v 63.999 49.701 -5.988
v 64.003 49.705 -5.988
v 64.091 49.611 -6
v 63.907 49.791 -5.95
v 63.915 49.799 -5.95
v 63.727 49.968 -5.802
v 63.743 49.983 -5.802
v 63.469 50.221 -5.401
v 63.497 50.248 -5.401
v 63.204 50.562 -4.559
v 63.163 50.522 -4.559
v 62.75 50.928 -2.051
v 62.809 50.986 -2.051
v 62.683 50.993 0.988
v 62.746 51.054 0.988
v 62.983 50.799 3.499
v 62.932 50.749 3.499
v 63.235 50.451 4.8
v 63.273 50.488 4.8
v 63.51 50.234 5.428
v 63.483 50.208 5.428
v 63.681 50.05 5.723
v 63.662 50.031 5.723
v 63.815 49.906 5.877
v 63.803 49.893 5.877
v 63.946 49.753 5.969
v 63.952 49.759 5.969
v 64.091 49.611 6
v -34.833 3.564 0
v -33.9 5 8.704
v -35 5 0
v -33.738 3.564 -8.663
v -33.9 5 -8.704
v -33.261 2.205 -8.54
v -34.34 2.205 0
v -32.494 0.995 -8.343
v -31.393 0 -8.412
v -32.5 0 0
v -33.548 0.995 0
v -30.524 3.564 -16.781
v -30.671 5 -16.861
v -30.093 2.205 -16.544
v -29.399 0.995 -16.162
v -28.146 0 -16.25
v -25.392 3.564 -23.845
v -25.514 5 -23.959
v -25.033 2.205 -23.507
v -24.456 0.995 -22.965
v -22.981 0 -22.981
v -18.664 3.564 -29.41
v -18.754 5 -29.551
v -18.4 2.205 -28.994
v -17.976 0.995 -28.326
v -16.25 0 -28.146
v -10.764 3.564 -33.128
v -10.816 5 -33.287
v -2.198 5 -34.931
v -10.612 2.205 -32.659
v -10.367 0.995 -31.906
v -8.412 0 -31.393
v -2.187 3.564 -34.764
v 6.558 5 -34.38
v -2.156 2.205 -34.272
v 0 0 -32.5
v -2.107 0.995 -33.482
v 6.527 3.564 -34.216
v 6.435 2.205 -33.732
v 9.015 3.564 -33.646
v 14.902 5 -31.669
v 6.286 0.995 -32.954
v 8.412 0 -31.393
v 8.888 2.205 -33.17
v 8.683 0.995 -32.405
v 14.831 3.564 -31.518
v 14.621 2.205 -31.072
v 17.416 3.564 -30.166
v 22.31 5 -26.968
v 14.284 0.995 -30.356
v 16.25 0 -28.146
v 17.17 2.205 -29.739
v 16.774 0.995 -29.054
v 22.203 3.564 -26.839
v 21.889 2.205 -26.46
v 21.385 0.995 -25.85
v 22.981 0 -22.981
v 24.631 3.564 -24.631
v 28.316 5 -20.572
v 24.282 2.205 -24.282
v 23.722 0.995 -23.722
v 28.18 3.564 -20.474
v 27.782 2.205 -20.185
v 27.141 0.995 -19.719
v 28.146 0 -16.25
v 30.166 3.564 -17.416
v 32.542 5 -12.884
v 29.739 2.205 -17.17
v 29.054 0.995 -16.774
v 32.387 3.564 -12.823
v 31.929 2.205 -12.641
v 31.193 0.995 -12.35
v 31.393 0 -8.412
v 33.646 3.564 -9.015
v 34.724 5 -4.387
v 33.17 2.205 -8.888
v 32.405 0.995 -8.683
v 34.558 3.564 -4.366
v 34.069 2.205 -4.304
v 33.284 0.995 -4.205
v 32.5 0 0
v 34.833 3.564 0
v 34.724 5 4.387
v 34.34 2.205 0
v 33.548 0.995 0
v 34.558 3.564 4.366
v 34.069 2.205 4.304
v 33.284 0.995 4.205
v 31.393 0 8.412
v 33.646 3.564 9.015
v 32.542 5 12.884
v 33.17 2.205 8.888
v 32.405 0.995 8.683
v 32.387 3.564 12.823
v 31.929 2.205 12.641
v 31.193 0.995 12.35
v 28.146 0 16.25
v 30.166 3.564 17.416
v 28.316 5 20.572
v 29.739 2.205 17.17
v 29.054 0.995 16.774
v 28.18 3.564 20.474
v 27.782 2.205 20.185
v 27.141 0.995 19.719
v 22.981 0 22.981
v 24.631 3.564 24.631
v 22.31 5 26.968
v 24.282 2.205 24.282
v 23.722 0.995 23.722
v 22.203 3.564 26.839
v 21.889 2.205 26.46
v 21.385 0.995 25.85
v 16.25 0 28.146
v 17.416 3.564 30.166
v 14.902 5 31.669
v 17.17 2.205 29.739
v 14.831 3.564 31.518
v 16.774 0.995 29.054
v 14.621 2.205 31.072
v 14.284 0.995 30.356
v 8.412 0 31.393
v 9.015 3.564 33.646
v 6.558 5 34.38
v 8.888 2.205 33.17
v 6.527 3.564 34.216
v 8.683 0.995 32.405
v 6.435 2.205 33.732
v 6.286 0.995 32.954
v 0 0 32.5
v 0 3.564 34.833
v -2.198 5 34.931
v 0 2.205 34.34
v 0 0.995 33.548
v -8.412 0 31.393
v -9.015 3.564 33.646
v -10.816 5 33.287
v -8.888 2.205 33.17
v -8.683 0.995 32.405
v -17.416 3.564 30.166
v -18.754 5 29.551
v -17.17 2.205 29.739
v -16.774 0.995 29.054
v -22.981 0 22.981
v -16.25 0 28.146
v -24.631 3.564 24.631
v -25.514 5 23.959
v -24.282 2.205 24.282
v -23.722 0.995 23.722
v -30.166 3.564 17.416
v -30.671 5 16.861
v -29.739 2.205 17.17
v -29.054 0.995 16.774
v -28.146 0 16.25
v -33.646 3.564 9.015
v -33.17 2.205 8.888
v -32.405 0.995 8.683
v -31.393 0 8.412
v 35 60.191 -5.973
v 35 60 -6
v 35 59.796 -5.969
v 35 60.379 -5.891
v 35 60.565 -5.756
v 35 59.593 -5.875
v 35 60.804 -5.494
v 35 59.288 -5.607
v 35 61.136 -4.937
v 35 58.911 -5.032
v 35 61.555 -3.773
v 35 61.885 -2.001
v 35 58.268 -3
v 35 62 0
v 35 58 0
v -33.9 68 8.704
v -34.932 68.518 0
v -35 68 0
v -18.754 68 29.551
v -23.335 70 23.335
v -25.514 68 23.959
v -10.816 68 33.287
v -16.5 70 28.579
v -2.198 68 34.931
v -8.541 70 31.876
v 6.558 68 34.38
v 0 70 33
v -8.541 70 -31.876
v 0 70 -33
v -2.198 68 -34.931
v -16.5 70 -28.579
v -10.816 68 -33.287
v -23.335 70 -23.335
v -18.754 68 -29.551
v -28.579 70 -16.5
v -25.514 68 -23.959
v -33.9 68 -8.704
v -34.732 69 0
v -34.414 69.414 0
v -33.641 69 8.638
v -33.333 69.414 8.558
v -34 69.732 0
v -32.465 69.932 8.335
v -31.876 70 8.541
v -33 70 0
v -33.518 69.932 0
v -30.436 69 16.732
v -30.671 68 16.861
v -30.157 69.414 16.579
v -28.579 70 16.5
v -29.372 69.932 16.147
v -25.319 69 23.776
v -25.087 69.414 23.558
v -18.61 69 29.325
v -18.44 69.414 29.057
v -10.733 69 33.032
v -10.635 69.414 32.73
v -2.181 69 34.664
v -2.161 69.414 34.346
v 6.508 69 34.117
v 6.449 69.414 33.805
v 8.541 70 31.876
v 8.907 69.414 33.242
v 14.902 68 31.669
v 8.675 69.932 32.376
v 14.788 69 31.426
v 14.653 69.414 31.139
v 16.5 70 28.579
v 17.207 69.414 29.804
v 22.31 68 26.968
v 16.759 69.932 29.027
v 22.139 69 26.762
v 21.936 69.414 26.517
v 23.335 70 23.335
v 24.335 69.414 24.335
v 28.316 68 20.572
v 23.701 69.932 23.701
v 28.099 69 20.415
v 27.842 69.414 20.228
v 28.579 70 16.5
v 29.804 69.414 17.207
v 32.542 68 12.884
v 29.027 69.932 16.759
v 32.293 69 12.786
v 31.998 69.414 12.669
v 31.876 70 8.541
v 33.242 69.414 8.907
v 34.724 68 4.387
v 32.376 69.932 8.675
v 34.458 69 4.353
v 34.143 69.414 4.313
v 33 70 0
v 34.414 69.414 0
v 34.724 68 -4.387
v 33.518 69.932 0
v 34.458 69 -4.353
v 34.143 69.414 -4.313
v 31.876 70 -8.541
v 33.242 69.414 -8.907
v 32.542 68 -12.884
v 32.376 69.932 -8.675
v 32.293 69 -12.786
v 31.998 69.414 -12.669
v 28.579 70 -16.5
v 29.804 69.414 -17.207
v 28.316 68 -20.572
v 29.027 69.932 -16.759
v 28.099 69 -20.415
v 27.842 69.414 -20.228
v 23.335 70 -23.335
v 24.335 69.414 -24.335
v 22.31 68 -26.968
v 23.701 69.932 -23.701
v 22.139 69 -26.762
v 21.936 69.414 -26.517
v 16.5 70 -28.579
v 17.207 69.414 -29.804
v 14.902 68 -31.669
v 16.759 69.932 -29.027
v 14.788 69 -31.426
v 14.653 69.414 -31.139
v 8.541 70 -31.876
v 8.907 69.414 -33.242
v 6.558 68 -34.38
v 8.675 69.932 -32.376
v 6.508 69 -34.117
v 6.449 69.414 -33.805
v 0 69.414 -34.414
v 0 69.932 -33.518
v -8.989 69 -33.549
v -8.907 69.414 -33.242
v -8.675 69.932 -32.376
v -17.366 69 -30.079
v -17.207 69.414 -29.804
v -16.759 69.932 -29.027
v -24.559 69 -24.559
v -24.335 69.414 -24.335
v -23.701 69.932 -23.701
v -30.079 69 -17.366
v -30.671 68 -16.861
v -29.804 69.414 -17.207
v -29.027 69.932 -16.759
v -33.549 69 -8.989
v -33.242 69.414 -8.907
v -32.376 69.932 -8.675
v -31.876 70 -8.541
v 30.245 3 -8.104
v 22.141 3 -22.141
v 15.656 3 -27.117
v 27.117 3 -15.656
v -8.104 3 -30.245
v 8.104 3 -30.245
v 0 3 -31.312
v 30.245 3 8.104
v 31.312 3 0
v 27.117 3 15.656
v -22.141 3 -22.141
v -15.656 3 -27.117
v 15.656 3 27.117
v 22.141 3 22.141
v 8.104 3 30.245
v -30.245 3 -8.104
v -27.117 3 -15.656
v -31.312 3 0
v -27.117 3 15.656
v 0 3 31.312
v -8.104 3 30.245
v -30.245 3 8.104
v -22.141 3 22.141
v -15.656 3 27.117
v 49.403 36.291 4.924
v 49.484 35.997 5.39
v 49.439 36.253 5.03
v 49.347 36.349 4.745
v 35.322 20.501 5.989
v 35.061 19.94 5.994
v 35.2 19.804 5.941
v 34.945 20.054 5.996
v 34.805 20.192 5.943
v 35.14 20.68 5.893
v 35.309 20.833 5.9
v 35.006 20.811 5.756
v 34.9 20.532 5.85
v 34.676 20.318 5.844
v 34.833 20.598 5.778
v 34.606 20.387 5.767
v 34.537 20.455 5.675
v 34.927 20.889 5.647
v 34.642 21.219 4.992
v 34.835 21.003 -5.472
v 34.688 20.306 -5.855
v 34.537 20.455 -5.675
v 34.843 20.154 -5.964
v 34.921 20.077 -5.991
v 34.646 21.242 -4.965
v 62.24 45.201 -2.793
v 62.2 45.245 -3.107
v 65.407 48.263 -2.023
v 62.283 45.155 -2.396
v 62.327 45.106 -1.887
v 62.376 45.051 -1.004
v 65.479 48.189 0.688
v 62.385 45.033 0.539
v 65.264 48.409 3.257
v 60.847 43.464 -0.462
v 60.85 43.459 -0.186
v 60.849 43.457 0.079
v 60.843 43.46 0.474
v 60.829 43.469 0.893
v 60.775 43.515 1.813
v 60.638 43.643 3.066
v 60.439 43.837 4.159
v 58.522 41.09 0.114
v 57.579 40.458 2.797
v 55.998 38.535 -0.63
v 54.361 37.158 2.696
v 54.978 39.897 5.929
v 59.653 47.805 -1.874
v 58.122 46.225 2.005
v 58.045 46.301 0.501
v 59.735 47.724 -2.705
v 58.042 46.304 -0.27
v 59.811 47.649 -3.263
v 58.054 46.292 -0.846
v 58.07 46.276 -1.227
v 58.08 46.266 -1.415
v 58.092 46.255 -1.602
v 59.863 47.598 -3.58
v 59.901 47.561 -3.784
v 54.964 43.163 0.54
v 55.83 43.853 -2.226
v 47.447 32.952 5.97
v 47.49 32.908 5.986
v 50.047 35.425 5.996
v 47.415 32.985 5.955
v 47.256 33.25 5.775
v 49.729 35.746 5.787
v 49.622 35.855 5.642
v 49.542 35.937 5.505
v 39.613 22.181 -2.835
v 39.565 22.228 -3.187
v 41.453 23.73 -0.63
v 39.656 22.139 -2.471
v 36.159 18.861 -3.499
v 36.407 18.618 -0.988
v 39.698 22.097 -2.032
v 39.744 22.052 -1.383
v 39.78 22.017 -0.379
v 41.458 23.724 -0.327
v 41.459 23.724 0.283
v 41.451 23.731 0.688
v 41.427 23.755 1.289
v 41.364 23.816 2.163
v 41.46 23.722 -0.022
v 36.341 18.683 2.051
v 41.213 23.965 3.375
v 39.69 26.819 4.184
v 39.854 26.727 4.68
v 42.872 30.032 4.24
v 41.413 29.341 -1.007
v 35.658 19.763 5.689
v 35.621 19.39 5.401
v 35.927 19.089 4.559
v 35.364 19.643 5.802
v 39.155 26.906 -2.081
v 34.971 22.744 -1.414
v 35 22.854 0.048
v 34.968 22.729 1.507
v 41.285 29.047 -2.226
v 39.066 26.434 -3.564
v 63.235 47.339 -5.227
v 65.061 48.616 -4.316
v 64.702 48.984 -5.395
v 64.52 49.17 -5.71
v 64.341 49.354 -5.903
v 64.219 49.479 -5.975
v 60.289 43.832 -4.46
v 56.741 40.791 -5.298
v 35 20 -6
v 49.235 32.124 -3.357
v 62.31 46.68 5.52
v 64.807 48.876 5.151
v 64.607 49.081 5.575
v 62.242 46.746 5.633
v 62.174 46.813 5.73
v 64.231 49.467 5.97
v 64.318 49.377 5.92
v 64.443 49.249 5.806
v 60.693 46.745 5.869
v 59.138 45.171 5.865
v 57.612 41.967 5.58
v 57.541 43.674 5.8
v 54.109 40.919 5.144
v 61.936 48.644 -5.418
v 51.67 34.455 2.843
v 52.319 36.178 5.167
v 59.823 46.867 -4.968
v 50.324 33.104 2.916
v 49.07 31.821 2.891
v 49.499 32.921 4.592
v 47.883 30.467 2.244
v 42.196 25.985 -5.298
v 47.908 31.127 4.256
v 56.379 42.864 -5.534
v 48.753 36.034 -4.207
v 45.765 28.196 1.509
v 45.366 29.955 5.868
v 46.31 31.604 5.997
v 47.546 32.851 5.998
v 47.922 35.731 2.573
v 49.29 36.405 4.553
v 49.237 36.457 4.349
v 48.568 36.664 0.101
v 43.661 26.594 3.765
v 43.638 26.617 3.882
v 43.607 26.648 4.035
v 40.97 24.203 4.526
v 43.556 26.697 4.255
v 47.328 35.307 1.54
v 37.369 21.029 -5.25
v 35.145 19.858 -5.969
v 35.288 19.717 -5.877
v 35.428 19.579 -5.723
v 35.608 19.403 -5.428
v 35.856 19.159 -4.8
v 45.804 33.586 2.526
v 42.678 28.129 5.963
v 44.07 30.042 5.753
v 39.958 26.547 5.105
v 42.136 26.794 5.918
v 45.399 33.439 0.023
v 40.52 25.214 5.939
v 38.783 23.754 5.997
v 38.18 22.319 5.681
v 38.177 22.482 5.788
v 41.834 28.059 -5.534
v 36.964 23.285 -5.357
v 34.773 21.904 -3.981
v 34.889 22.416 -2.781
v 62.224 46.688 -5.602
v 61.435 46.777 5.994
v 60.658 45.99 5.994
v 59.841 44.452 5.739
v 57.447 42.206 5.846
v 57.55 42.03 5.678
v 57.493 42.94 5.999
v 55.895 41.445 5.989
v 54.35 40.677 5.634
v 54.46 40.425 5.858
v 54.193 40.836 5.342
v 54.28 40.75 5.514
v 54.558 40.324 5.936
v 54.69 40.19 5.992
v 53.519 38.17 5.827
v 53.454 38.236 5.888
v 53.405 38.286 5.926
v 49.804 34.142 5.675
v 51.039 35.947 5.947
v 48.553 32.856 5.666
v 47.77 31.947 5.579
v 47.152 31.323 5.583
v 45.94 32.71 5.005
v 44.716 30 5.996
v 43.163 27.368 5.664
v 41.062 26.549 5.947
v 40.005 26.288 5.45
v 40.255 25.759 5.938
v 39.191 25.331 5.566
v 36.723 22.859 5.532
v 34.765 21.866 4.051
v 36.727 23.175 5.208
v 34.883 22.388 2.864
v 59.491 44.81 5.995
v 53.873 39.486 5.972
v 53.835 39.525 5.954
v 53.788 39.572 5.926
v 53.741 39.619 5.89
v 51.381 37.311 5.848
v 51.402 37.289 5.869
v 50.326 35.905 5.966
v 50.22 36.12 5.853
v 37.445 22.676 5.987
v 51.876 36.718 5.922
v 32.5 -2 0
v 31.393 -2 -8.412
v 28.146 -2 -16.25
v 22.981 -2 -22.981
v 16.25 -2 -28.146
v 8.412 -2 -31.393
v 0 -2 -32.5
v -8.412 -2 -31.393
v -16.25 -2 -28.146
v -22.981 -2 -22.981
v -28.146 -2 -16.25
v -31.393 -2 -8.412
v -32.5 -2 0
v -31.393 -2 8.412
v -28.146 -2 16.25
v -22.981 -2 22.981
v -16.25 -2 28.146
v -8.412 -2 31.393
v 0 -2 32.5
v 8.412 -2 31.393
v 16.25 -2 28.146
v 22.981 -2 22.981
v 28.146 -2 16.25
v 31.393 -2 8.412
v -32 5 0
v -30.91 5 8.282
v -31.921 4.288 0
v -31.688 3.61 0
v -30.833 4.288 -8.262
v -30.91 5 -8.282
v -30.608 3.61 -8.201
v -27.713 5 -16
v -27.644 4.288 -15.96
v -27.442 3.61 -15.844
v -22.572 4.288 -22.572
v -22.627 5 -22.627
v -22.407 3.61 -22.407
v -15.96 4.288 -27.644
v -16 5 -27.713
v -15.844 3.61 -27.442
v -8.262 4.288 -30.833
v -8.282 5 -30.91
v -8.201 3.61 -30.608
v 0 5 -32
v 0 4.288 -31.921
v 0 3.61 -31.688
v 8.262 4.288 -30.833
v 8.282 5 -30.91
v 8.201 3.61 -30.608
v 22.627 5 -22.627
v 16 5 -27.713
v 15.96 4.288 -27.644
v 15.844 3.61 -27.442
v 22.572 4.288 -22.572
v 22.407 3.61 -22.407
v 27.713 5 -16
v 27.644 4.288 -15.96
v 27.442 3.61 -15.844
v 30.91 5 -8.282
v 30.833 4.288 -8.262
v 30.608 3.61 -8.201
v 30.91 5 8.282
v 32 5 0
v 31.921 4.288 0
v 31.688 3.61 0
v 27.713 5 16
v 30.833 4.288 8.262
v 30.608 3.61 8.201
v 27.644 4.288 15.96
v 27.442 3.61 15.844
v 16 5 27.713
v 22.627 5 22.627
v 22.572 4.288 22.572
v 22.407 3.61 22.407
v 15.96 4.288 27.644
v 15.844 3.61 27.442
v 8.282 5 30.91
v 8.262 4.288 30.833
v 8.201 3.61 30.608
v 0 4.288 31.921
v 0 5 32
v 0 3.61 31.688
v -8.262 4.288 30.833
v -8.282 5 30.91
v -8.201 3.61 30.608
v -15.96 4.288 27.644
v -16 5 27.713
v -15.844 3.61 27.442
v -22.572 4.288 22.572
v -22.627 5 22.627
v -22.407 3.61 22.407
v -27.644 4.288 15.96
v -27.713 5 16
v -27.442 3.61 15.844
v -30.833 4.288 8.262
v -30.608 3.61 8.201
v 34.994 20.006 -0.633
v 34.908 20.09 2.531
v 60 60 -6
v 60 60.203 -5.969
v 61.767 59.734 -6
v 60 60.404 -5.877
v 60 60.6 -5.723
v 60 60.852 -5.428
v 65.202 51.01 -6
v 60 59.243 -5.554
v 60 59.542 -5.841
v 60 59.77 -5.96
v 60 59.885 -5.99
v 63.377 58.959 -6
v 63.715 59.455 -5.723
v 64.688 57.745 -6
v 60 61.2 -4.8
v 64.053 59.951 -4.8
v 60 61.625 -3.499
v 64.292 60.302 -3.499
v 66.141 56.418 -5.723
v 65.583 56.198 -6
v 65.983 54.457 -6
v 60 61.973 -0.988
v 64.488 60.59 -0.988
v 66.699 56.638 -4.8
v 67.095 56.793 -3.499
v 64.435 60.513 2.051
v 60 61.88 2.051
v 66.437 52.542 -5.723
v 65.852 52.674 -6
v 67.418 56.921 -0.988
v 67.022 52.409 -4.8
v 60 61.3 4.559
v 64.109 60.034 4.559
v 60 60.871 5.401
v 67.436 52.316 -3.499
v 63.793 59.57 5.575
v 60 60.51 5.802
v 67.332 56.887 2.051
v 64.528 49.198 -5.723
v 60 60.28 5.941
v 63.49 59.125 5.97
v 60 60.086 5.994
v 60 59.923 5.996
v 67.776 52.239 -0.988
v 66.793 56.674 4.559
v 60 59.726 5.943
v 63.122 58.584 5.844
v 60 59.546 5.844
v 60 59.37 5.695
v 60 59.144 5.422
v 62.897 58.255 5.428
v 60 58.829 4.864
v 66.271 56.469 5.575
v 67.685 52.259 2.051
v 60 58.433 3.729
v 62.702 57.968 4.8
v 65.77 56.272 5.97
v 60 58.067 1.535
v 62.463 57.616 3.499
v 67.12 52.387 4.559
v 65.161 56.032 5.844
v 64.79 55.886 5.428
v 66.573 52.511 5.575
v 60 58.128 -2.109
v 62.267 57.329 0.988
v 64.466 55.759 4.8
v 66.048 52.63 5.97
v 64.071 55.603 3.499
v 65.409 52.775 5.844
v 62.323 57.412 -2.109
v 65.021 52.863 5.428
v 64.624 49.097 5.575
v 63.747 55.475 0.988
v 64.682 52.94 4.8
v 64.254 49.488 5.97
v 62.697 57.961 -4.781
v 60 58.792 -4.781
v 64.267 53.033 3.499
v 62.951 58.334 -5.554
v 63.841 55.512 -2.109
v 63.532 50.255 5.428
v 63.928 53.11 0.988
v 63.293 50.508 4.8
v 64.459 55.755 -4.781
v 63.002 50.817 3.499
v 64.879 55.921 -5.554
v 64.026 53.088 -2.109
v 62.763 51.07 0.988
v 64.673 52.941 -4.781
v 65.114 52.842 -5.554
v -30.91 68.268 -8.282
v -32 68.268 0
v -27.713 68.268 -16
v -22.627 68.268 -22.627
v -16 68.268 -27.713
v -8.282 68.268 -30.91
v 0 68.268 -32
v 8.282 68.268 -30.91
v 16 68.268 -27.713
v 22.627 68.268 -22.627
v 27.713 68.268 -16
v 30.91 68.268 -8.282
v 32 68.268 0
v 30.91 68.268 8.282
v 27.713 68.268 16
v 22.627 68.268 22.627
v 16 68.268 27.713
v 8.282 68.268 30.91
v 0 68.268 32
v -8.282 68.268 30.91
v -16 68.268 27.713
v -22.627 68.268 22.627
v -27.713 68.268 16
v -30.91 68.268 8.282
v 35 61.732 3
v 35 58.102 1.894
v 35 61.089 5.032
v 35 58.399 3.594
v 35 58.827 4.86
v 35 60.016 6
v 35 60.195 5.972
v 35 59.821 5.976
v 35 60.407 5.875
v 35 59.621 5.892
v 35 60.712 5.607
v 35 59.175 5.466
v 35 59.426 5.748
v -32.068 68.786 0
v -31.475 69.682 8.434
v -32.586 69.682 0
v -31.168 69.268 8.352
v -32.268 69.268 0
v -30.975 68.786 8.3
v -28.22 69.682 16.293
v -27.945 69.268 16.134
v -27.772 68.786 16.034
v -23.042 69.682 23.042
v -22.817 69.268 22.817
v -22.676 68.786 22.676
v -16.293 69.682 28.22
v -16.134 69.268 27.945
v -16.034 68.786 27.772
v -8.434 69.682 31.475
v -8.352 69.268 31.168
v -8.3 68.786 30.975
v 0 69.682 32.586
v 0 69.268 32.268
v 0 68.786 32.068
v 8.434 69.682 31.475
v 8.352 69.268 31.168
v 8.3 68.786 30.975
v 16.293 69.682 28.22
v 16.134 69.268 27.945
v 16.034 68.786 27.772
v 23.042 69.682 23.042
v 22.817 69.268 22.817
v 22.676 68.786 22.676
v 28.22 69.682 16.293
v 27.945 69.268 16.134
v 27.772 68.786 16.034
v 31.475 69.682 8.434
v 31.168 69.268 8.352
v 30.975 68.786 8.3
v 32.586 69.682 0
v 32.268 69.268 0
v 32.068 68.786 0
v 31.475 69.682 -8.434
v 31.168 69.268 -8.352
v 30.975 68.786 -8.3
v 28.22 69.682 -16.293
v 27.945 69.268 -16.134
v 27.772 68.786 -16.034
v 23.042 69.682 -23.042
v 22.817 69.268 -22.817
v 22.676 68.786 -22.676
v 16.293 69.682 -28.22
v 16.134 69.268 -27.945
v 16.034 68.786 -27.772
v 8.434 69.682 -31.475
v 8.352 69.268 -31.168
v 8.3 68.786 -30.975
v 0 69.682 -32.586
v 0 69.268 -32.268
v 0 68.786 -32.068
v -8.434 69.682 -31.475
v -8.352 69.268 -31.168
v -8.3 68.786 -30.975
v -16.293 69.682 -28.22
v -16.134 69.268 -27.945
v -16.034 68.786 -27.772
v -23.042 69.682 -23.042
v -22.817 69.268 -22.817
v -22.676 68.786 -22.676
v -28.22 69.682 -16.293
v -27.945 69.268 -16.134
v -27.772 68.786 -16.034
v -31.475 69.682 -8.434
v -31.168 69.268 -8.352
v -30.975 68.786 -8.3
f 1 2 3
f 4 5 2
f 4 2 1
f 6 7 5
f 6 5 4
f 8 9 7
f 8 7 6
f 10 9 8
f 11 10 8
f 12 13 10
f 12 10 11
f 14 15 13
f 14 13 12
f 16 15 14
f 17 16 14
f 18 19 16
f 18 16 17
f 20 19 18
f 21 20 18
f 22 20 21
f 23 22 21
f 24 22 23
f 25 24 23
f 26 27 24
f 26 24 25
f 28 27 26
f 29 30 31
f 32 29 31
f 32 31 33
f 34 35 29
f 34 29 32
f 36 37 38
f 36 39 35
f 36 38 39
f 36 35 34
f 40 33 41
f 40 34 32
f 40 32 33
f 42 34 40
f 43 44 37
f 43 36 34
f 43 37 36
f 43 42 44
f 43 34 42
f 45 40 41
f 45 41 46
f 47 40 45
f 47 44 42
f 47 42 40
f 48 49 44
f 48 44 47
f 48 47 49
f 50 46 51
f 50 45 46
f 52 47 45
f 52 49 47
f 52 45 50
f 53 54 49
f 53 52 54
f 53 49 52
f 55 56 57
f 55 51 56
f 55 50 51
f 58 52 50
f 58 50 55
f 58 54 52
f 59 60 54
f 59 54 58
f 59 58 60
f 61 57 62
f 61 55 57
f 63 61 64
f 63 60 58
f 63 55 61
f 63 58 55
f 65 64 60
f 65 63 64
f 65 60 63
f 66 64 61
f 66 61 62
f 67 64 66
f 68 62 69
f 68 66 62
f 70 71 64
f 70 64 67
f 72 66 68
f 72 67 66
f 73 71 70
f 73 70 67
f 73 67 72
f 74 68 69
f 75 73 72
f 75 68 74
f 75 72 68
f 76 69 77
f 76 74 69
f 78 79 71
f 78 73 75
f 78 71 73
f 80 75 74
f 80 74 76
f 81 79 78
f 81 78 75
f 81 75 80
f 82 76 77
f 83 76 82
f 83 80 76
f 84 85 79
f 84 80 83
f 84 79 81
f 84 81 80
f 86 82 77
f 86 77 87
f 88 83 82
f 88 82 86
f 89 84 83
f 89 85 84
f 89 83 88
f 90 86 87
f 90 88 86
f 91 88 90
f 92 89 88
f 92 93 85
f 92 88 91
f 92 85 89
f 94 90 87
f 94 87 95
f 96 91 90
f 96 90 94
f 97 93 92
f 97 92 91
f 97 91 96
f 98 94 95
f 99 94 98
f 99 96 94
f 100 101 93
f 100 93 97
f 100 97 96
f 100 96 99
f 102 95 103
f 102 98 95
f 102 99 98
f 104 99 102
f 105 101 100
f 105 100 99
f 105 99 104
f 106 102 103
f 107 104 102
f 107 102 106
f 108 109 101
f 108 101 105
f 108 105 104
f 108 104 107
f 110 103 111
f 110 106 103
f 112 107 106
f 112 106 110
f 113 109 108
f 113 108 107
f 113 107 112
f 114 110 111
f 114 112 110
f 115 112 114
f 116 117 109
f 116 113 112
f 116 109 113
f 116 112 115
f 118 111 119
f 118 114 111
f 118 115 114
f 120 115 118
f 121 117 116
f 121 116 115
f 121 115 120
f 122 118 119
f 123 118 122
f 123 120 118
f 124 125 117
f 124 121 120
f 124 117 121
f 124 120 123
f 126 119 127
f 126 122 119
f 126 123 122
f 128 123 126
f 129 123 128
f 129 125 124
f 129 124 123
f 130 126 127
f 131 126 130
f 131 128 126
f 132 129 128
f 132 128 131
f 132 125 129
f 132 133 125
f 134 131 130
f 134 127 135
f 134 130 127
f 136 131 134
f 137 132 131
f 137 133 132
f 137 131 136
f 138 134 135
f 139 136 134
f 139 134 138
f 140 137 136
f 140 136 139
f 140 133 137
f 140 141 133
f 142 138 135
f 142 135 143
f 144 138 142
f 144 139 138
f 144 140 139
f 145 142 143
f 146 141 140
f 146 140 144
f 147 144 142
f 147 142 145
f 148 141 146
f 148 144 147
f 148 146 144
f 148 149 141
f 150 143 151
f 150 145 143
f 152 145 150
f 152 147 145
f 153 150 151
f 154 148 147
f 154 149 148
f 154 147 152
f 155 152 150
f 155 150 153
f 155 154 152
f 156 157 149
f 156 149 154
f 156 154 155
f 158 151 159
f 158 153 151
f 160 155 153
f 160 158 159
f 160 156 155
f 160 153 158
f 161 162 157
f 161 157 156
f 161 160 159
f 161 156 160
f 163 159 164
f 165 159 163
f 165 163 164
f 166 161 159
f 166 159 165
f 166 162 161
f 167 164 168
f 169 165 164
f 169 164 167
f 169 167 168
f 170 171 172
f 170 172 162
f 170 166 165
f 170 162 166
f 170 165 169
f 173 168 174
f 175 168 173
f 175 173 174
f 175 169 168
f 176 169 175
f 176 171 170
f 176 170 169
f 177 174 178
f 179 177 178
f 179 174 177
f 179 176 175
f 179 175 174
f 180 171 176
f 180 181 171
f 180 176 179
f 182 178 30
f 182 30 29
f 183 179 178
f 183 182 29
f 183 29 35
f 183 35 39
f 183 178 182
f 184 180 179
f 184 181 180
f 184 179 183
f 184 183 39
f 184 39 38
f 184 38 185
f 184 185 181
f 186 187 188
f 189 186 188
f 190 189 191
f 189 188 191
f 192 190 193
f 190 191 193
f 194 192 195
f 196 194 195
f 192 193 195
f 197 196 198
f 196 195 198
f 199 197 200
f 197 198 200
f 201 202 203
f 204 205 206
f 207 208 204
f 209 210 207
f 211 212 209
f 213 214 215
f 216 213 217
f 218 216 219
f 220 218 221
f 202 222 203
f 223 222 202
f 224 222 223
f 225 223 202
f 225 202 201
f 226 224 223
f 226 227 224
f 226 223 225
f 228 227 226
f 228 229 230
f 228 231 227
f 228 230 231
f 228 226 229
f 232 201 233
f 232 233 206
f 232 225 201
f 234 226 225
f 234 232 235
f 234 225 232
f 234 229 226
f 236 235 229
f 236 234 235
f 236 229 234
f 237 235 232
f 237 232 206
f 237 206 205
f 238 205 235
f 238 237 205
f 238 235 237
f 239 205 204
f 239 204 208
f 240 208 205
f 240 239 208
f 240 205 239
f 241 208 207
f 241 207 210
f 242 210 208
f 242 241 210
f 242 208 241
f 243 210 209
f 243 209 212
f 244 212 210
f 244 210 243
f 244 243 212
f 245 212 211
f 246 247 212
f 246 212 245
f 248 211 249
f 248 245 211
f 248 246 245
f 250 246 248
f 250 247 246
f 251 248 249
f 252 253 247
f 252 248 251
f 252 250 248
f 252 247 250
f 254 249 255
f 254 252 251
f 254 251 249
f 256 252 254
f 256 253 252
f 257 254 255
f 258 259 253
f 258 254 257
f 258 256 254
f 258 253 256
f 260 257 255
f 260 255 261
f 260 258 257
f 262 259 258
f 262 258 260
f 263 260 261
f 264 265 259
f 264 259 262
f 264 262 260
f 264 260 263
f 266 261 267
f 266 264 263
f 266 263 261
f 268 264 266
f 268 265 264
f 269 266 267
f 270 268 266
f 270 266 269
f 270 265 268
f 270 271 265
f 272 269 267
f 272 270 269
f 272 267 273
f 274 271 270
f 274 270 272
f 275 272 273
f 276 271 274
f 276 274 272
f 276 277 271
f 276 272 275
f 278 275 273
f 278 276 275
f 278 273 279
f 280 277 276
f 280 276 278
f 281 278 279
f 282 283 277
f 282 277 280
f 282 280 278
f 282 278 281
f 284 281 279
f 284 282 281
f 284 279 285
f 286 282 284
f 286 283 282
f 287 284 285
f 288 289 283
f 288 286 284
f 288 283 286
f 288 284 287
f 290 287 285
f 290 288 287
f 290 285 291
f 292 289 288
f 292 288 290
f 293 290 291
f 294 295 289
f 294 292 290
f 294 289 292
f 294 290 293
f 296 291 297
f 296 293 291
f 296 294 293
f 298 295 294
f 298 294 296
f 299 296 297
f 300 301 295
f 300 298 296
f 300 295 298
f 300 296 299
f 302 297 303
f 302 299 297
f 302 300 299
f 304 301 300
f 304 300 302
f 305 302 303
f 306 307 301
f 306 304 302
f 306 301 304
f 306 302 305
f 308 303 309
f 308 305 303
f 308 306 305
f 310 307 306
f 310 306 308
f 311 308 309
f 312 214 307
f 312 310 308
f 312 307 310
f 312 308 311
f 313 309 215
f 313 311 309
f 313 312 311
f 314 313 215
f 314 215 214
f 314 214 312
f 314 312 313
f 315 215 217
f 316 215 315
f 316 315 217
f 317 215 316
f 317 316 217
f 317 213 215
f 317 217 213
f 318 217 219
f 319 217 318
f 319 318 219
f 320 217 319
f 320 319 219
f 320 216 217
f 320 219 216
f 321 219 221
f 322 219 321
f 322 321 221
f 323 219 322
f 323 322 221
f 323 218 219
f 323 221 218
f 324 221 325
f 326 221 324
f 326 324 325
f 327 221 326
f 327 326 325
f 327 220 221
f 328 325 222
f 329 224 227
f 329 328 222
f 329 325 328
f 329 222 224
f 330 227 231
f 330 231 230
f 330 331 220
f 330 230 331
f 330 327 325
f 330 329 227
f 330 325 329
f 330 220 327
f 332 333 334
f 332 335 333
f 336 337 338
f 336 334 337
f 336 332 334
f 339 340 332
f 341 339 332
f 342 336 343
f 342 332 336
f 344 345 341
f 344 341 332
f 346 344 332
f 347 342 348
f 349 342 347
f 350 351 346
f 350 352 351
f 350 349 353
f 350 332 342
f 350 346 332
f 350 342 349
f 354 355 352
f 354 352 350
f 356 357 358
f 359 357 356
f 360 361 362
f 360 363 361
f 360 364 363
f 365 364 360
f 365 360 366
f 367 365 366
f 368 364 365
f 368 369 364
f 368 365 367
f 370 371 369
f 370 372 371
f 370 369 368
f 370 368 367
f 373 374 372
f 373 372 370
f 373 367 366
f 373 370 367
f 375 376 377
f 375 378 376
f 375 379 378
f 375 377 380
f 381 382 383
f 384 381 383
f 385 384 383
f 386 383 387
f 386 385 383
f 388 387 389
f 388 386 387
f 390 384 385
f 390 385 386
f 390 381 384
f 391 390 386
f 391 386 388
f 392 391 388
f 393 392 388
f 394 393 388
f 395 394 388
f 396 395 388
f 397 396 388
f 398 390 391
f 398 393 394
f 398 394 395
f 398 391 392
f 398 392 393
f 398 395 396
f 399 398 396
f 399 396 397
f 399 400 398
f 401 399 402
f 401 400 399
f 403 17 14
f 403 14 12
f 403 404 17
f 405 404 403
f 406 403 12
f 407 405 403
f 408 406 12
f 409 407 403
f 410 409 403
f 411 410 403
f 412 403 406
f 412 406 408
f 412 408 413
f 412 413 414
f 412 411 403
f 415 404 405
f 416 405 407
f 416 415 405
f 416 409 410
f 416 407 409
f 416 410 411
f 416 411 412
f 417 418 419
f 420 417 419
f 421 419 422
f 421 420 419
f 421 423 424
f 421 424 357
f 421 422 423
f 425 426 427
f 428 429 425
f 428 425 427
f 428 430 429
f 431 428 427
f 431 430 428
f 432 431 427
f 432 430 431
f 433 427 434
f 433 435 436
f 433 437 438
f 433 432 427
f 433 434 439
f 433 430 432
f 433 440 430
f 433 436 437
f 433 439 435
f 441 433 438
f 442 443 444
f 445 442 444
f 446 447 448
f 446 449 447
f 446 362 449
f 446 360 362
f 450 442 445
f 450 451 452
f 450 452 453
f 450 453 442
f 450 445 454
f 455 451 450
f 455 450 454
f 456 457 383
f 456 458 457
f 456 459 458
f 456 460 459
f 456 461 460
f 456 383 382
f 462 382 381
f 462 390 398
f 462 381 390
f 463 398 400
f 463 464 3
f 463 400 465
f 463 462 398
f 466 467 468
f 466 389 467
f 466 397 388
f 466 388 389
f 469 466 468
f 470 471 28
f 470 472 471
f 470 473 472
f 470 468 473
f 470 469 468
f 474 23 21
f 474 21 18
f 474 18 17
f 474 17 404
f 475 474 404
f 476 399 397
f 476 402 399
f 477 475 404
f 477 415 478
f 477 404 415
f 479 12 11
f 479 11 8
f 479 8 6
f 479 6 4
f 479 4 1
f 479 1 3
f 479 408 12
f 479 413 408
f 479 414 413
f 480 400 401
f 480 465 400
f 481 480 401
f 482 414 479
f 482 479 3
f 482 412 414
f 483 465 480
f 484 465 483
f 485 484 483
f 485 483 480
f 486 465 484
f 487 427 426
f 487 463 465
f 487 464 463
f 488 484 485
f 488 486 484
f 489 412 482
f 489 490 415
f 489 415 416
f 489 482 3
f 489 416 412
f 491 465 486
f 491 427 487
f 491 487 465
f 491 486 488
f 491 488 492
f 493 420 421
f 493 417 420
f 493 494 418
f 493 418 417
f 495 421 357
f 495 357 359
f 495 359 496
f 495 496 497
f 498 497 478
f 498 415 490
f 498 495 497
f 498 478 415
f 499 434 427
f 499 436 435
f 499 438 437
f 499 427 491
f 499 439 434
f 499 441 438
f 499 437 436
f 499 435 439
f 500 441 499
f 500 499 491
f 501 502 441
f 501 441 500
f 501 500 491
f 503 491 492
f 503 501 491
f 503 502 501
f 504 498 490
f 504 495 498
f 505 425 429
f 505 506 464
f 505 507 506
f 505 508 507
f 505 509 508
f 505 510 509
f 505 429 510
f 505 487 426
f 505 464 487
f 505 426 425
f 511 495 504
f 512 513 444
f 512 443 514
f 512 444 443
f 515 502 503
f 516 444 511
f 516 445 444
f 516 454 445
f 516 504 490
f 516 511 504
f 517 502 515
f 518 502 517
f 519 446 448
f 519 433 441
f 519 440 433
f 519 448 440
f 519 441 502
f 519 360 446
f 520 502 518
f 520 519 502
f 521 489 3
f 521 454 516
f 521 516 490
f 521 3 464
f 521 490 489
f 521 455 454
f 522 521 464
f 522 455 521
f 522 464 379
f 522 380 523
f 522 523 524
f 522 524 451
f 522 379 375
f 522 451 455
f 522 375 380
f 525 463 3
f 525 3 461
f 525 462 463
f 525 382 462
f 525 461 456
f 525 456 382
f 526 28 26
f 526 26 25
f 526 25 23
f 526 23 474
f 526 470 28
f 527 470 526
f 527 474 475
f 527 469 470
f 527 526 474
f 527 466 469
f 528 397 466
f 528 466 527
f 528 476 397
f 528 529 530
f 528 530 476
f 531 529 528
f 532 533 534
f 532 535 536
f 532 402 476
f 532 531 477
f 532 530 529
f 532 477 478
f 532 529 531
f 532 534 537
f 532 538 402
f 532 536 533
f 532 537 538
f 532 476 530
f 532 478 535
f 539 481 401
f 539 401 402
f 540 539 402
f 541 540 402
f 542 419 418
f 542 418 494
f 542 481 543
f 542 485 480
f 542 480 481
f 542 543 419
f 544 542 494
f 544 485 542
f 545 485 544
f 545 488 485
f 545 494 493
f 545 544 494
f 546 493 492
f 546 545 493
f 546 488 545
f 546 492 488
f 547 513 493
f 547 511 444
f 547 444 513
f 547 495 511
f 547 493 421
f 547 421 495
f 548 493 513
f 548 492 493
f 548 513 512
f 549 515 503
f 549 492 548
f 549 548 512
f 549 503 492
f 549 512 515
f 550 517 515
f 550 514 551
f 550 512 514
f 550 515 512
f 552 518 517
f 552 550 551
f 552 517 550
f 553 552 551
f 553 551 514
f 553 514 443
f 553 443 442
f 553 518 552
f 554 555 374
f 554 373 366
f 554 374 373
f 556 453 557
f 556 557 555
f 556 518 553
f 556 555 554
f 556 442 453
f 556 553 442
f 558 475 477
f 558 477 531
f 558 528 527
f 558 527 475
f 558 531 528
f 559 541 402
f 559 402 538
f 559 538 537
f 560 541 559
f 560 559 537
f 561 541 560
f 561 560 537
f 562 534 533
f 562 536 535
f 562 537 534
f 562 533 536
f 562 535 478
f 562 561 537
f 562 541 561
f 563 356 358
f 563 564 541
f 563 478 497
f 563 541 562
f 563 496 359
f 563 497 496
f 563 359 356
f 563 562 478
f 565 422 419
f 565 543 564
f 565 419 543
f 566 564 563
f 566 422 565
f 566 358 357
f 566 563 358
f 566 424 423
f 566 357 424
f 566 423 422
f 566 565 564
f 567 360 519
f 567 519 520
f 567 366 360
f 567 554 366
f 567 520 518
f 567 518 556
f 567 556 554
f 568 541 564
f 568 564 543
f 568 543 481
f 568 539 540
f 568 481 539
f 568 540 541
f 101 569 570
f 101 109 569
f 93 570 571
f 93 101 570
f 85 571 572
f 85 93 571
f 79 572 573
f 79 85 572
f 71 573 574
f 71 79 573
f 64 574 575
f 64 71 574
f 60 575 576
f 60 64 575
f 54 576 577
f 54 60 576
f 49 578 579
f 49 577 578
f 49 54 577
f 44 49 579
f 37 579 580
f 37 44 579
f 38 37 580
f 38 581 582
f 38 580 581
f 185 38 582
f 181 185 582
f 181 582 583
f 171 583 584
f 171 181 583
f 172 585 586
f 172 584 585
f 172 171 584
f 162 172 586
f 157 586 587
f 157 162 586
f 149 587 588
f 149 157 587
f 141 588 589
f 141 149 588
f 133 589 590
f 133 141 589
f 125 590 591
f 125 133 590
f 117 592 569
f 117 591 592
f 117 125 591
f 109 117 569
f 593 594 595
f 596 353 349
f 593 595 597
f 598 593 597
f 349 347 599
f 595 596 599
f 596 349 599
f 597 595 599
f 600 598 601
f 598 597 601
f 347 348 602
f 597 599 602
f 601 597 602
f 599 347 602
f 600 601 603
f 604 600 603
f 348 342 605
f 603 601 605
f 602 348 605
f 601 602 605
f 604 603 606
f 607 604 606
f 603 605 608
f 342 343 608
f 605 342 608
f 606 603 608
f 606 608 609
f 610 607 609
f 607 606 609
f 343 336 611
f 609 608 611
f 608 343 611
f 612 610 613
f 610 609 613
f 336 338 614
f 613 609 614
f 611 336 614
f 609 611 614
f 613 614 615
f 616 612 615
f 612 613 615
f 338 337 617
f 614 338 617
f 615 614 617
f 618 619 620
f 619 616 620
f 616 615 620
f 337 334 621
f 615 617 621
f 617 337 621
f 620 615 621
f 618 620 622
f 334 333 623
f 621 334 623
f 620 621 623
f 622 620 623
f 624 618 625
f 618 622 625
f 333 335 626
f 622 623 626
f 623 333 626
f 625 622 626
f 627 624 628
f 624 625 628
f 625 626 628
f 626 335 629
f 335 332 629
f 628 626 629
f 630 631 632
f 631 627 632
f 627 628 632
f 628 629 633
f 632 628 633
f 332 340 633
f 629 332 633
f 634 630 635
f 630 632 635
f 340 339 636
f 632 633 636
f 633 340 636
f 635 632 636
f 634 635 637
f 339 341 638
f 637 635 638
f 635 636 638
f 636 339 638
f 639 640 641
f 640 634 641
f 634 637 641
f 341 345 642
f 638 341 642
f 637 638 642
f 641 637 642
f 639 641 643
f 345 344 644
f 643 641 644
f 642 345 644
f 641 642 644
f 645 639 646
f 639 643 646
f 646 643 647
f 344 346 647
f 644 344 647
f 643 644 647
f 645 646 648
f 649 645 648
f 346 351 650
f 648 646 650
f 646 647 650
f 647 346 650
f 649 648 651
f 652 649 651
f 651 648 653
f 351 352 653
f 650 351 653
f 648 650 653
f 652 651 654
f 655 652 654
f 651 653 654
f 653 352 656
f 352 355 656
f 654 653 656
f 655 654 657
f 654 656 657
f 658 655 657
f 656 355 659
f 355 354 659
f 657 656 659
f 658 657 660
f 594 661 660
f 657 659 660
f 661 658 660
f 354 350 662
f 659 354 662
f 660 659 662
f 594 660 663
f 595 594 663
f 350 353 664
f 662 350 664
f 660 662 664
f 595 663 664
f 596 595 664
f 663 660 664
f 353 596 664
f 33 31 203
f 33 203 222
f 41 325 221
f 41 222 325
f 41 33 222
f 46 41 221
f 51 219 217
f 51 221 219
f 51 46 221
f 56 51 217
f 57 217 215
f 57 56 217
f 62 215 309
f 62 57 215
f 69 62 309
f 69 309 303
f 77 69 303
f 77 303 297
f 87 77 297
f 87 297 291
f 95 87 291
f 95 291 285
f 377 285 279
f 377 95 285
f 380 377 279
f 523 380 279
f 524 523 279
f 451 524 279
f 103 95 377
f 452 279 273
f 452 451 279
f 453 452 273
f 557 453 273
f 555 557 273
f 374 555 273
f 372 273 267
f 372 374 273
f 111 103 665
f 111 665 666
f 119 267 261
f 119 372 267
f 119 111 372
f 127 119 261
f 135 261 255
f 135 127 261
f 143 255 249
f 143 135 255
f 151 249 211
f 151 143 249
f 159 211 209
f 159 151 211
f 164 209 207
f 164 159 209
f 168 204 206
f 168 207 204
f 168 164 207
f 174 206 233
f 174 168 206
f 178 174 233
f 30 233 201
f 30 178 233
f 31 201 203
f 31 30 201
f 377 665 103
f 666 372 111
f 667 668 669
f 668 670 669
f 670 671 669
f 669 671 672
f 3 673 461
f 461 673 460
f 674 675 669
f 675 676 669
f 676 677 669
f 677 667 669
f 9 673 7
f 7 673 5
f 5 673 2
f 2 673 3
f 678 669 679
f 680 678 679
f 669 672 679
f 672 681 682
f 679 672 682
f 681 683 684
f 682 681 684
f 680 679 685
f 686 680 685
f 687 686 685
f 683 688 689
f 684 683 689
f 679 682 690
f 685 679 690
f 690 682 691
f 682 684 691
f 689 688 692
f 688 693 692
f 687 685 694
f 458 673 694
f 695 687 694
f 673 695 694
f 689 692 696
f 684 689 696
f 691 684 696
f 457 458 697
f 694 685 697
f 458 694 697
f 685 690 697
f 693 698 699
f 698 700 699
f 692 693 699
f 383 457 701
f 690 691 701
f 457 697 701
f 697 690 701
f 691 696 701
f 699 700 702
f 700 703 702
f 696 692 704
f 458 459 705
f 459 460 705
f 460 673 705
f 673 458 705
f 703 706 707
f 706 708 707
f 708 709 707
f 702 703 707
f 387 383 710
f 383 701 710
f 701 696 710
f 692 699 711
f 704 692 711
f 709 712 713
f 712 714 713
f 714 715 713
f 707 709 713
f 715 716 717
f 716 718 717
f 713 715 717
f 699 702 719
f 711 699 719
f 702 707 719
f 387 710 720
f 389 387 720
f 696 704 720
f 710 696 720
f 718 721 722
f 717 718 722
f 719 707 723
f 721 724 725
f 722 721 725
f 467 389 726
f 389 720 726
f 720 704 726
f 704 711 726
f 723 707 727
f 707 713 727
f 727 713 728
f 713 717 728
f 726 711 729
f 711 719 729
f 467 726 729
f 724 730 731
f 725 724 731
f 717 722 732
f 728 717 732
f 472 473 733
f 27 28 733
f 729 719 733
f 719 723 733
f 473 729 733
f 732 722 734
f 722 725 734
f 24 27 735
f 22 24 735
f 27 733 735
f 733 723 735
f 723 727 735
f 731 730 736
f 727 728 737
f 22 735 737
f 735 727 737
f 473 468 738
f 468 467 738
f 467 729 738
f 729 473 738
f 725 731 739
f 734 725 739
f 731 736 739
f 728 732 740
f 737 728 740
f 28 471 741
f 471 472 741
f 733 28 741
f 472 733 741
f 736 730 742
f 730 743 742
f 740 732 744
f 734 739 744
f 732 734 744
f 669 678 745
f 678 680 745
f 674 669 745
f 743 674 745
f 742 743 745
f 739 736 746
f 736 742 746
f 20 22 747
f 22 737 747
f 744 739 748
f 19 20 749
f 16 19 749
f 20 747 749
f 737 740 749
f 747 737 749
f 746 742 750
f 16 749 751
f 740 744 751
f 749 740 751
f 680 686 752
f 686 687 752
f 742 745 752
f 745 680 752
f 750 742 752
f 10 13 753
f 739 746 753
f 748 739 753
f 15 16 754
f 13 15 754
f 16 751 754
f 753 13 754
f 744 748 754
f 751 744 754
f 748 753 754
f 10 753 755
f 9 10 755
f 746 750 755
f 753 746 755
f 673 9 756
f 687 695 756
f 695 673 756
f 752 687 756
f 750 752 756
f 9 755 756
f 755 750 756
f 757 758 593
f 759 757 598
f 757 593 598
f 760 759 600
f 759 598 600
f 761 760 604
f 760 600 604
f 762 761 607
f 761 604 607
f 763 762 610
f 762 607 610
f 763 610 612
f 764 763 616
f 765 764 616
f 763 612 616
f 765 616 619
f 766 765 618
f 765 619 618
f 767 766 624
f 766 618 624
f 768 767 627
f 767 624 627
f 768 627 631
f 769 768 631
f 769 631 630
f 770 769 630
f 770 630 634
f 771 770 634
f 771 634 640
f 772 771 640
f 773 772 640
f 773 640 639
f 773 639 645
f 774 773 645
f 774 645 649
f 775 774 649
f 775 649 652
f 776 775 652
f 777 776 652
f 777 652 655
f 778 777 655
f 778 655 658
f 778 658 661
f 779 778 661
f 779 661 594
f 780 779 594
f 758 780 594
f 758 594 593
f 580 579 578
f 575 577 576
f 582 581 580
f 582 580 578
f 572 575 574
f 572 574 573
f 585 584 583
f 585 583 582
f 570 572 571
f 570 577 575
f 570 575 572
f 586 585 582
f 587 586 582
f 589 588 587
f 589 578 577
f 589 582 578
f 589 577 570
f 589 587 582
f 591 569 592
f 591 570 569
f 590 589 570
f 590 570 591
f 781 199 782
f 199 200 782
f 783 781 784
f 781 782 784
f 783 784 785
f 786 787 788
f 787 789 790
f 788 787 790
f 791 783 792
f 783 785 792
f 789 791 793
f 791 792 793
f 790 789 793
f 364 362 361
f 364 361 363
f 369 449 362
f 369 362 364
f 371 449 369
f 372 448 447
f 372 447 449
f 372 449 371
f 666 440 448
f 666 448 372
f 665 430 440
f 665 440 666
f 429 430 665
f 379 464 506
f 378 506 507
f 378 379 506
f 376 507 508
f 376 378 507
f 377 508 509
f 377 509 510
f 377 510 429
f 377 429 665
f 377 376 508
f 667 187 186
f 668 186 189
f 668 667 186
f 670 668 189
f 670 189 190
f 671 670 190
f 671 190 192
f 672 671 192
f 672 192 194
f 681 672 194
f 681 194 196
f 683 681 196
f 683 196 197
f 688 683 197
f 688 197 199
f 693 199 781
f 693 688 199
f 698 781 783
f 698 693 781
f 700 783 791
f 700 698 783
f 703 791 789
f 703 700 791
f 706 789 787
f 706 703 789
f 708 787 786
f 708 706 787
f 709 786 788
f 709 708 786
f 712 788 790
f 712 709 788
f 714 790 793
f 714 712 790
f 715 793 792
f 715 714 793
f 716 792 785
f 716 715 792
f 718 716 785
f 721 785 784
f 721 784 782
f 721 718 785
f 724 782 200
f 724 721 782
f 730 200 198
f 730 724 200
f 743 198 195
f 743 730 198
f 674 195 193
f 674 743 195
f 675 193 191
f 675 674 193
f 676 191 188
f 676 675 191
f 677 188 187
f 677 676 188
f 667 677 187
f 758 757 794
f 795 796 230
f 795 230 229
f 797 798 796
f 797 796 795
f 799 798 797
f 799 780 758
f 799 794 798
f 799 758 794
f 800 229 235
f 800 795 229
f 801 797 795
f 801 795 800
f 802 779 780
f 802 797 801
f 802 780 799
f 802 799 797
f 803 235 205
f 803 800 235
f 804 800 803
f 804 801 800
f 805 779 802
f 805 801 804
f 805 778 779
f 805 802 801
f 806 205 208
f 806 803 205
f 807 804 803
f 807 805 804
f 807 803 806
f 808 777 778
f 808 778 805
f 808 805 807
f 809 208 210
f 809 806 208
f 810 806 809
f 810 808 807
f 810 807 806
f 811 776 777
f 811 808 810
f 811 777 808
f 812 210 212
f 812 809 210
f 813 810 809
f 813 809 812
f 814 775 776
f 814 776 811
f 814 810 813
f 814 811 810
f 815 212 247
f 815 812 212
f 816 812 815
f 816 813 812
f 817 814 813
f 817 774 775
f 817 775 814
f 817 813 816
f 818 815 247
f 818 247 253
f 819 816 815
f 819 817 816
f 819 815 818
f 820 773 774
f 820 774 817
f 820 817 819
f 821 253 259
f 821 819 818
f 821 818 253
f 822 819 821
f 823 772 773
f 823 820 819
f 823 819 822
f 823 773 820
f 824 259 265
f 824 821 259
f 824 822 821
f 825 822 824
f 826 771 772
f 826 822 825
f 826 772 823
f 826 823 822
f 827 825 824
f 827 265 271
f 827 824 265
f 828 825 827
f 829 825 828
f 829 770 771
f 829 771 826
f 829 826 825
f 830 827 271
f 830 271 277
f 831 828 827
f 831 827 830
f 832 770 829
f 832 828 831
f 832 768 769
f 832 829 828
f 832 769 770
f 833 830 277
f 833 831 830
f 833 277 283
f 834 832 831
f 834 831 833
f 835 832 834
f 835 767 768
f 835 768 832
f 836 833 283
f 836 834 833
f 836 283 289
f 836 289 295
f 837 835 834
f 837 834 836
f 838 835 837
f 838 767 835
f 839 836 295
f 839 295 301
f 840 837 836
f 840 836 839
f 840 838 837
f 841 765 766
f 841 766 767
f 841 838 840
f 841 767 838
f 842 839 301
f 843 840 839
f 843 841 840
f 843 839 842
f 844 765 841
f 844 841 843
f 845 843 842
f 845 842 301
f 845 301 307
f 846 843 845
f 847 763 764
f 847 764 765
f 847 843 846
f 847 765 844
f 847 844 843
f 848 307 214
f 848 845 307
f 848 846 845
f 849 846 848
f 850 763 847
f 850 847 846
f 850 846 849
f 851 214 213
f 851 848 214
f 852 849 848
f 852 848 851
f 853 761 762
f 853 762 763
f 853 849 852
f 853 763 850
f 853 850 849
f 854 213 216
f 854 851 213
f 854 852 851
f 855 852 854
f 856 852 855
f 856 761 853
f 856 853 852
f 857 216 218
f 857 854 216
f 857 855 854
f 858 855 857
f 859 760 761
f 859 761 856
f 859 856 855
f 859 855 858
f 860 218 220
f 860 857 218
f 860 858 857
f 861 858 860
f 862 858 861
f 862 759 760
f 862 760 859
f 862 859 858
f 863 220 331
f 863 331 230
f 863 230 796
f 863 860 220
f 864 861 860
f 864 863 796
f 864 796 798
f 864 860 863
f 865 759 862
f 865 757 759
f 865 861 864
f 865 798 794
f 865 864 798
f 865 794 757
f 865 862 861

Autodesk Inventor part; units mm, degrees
sketch "Sketch1" plane through (0, 0, 0) normal (0, 0, 1) x (1, 0, 0)
  line L0 (0, 0) -> (0, 70)
  line L1 (0, 70) -> (-35, 70)
  line L2 (-35, 70) -> (-35, 5)
  line L3 (0, 0) -> (-32.5, 0)
  arc A0 (-35, 5) -> (-32.5, 0) centre (-28.75, 5) ccw
  dimension "d0" = 70
  dimension "d1" = 35
  dimension "d2" = 65
  dimension "d3" = 32.5
revolve "Revolution1" add sketch "Sketch1" angle 360 about axis through (0, 0, 0) along (0, 1, 0)
shell "Shell1" thickness 3 removed faces 1 at (-0.2748, 70, -9.3581)
sketch "Sketch2" plane through (0, 0, 0) normal (0, 0, 1) x (1, 0, 0)
  line L0 (35, 60) -> (60, 60)
  line L1 (35, 20) -> (64.0906, 49.6106)
  line L2 (35, 5) -> (35, 70) projected
  arc A0 (64.0906, 49.6106) -> (60, 60) centre (60, 54) ccw
ref_plane "Work Plane1" through (35, 60, 0) normal (1, 0, 0) x (0, 1, 0)
sketch "Sketch3" plane through (35, 60, 0) normal (1, 0, 0) x (0, 1, 0)
  ellipse E0 centre (0, 0) end of major axis (0, -6) minor radius 2
  point P0 (-60, 0)
ref_plane "Work Plane2" through (35, 5, 0) normal (1, 0, 0) x (0, 1, 0)
sketch "Sketch4" plane through (35, 5, 0) normal (1, 0, 0) x (0, 1, 0)
  point P0 (-5, 0)
ref_plane "Work Plane3" through (35, 20, 0) normal (1, 0, 0) x (0, 1, 0)
sketch "Sketch5" plane through (35, 20, 0) normal (1, 0, 0) x (0, 1, 0)
  ellipse E0 centre (0, 0) end of major axis (0, -5) minor radius 3
  point P0 (-20, 0)
sweep "Sweep1" add profiles "Sketch3" path "Sketch2" path curves L0 A0 L1
fillet "Fillet1" radius 2 2 edges at (35, 70, 0) (32, 70, 0)
sketch "Sketch6" plane through (0, 0, 0) normal (0, -1, 0) x (1, 0, 0)
  circle A0 centre (0, 0) radius 31
  circle A1 centre (0, 0) radius 32.5
  dimension "d34" = 62
  dimension "d35" = 65
extrude "Extrusion1" add sketch "Sketch6" along normal blind 2 contours A0 | A1
properties part number "Lab No. 2"
